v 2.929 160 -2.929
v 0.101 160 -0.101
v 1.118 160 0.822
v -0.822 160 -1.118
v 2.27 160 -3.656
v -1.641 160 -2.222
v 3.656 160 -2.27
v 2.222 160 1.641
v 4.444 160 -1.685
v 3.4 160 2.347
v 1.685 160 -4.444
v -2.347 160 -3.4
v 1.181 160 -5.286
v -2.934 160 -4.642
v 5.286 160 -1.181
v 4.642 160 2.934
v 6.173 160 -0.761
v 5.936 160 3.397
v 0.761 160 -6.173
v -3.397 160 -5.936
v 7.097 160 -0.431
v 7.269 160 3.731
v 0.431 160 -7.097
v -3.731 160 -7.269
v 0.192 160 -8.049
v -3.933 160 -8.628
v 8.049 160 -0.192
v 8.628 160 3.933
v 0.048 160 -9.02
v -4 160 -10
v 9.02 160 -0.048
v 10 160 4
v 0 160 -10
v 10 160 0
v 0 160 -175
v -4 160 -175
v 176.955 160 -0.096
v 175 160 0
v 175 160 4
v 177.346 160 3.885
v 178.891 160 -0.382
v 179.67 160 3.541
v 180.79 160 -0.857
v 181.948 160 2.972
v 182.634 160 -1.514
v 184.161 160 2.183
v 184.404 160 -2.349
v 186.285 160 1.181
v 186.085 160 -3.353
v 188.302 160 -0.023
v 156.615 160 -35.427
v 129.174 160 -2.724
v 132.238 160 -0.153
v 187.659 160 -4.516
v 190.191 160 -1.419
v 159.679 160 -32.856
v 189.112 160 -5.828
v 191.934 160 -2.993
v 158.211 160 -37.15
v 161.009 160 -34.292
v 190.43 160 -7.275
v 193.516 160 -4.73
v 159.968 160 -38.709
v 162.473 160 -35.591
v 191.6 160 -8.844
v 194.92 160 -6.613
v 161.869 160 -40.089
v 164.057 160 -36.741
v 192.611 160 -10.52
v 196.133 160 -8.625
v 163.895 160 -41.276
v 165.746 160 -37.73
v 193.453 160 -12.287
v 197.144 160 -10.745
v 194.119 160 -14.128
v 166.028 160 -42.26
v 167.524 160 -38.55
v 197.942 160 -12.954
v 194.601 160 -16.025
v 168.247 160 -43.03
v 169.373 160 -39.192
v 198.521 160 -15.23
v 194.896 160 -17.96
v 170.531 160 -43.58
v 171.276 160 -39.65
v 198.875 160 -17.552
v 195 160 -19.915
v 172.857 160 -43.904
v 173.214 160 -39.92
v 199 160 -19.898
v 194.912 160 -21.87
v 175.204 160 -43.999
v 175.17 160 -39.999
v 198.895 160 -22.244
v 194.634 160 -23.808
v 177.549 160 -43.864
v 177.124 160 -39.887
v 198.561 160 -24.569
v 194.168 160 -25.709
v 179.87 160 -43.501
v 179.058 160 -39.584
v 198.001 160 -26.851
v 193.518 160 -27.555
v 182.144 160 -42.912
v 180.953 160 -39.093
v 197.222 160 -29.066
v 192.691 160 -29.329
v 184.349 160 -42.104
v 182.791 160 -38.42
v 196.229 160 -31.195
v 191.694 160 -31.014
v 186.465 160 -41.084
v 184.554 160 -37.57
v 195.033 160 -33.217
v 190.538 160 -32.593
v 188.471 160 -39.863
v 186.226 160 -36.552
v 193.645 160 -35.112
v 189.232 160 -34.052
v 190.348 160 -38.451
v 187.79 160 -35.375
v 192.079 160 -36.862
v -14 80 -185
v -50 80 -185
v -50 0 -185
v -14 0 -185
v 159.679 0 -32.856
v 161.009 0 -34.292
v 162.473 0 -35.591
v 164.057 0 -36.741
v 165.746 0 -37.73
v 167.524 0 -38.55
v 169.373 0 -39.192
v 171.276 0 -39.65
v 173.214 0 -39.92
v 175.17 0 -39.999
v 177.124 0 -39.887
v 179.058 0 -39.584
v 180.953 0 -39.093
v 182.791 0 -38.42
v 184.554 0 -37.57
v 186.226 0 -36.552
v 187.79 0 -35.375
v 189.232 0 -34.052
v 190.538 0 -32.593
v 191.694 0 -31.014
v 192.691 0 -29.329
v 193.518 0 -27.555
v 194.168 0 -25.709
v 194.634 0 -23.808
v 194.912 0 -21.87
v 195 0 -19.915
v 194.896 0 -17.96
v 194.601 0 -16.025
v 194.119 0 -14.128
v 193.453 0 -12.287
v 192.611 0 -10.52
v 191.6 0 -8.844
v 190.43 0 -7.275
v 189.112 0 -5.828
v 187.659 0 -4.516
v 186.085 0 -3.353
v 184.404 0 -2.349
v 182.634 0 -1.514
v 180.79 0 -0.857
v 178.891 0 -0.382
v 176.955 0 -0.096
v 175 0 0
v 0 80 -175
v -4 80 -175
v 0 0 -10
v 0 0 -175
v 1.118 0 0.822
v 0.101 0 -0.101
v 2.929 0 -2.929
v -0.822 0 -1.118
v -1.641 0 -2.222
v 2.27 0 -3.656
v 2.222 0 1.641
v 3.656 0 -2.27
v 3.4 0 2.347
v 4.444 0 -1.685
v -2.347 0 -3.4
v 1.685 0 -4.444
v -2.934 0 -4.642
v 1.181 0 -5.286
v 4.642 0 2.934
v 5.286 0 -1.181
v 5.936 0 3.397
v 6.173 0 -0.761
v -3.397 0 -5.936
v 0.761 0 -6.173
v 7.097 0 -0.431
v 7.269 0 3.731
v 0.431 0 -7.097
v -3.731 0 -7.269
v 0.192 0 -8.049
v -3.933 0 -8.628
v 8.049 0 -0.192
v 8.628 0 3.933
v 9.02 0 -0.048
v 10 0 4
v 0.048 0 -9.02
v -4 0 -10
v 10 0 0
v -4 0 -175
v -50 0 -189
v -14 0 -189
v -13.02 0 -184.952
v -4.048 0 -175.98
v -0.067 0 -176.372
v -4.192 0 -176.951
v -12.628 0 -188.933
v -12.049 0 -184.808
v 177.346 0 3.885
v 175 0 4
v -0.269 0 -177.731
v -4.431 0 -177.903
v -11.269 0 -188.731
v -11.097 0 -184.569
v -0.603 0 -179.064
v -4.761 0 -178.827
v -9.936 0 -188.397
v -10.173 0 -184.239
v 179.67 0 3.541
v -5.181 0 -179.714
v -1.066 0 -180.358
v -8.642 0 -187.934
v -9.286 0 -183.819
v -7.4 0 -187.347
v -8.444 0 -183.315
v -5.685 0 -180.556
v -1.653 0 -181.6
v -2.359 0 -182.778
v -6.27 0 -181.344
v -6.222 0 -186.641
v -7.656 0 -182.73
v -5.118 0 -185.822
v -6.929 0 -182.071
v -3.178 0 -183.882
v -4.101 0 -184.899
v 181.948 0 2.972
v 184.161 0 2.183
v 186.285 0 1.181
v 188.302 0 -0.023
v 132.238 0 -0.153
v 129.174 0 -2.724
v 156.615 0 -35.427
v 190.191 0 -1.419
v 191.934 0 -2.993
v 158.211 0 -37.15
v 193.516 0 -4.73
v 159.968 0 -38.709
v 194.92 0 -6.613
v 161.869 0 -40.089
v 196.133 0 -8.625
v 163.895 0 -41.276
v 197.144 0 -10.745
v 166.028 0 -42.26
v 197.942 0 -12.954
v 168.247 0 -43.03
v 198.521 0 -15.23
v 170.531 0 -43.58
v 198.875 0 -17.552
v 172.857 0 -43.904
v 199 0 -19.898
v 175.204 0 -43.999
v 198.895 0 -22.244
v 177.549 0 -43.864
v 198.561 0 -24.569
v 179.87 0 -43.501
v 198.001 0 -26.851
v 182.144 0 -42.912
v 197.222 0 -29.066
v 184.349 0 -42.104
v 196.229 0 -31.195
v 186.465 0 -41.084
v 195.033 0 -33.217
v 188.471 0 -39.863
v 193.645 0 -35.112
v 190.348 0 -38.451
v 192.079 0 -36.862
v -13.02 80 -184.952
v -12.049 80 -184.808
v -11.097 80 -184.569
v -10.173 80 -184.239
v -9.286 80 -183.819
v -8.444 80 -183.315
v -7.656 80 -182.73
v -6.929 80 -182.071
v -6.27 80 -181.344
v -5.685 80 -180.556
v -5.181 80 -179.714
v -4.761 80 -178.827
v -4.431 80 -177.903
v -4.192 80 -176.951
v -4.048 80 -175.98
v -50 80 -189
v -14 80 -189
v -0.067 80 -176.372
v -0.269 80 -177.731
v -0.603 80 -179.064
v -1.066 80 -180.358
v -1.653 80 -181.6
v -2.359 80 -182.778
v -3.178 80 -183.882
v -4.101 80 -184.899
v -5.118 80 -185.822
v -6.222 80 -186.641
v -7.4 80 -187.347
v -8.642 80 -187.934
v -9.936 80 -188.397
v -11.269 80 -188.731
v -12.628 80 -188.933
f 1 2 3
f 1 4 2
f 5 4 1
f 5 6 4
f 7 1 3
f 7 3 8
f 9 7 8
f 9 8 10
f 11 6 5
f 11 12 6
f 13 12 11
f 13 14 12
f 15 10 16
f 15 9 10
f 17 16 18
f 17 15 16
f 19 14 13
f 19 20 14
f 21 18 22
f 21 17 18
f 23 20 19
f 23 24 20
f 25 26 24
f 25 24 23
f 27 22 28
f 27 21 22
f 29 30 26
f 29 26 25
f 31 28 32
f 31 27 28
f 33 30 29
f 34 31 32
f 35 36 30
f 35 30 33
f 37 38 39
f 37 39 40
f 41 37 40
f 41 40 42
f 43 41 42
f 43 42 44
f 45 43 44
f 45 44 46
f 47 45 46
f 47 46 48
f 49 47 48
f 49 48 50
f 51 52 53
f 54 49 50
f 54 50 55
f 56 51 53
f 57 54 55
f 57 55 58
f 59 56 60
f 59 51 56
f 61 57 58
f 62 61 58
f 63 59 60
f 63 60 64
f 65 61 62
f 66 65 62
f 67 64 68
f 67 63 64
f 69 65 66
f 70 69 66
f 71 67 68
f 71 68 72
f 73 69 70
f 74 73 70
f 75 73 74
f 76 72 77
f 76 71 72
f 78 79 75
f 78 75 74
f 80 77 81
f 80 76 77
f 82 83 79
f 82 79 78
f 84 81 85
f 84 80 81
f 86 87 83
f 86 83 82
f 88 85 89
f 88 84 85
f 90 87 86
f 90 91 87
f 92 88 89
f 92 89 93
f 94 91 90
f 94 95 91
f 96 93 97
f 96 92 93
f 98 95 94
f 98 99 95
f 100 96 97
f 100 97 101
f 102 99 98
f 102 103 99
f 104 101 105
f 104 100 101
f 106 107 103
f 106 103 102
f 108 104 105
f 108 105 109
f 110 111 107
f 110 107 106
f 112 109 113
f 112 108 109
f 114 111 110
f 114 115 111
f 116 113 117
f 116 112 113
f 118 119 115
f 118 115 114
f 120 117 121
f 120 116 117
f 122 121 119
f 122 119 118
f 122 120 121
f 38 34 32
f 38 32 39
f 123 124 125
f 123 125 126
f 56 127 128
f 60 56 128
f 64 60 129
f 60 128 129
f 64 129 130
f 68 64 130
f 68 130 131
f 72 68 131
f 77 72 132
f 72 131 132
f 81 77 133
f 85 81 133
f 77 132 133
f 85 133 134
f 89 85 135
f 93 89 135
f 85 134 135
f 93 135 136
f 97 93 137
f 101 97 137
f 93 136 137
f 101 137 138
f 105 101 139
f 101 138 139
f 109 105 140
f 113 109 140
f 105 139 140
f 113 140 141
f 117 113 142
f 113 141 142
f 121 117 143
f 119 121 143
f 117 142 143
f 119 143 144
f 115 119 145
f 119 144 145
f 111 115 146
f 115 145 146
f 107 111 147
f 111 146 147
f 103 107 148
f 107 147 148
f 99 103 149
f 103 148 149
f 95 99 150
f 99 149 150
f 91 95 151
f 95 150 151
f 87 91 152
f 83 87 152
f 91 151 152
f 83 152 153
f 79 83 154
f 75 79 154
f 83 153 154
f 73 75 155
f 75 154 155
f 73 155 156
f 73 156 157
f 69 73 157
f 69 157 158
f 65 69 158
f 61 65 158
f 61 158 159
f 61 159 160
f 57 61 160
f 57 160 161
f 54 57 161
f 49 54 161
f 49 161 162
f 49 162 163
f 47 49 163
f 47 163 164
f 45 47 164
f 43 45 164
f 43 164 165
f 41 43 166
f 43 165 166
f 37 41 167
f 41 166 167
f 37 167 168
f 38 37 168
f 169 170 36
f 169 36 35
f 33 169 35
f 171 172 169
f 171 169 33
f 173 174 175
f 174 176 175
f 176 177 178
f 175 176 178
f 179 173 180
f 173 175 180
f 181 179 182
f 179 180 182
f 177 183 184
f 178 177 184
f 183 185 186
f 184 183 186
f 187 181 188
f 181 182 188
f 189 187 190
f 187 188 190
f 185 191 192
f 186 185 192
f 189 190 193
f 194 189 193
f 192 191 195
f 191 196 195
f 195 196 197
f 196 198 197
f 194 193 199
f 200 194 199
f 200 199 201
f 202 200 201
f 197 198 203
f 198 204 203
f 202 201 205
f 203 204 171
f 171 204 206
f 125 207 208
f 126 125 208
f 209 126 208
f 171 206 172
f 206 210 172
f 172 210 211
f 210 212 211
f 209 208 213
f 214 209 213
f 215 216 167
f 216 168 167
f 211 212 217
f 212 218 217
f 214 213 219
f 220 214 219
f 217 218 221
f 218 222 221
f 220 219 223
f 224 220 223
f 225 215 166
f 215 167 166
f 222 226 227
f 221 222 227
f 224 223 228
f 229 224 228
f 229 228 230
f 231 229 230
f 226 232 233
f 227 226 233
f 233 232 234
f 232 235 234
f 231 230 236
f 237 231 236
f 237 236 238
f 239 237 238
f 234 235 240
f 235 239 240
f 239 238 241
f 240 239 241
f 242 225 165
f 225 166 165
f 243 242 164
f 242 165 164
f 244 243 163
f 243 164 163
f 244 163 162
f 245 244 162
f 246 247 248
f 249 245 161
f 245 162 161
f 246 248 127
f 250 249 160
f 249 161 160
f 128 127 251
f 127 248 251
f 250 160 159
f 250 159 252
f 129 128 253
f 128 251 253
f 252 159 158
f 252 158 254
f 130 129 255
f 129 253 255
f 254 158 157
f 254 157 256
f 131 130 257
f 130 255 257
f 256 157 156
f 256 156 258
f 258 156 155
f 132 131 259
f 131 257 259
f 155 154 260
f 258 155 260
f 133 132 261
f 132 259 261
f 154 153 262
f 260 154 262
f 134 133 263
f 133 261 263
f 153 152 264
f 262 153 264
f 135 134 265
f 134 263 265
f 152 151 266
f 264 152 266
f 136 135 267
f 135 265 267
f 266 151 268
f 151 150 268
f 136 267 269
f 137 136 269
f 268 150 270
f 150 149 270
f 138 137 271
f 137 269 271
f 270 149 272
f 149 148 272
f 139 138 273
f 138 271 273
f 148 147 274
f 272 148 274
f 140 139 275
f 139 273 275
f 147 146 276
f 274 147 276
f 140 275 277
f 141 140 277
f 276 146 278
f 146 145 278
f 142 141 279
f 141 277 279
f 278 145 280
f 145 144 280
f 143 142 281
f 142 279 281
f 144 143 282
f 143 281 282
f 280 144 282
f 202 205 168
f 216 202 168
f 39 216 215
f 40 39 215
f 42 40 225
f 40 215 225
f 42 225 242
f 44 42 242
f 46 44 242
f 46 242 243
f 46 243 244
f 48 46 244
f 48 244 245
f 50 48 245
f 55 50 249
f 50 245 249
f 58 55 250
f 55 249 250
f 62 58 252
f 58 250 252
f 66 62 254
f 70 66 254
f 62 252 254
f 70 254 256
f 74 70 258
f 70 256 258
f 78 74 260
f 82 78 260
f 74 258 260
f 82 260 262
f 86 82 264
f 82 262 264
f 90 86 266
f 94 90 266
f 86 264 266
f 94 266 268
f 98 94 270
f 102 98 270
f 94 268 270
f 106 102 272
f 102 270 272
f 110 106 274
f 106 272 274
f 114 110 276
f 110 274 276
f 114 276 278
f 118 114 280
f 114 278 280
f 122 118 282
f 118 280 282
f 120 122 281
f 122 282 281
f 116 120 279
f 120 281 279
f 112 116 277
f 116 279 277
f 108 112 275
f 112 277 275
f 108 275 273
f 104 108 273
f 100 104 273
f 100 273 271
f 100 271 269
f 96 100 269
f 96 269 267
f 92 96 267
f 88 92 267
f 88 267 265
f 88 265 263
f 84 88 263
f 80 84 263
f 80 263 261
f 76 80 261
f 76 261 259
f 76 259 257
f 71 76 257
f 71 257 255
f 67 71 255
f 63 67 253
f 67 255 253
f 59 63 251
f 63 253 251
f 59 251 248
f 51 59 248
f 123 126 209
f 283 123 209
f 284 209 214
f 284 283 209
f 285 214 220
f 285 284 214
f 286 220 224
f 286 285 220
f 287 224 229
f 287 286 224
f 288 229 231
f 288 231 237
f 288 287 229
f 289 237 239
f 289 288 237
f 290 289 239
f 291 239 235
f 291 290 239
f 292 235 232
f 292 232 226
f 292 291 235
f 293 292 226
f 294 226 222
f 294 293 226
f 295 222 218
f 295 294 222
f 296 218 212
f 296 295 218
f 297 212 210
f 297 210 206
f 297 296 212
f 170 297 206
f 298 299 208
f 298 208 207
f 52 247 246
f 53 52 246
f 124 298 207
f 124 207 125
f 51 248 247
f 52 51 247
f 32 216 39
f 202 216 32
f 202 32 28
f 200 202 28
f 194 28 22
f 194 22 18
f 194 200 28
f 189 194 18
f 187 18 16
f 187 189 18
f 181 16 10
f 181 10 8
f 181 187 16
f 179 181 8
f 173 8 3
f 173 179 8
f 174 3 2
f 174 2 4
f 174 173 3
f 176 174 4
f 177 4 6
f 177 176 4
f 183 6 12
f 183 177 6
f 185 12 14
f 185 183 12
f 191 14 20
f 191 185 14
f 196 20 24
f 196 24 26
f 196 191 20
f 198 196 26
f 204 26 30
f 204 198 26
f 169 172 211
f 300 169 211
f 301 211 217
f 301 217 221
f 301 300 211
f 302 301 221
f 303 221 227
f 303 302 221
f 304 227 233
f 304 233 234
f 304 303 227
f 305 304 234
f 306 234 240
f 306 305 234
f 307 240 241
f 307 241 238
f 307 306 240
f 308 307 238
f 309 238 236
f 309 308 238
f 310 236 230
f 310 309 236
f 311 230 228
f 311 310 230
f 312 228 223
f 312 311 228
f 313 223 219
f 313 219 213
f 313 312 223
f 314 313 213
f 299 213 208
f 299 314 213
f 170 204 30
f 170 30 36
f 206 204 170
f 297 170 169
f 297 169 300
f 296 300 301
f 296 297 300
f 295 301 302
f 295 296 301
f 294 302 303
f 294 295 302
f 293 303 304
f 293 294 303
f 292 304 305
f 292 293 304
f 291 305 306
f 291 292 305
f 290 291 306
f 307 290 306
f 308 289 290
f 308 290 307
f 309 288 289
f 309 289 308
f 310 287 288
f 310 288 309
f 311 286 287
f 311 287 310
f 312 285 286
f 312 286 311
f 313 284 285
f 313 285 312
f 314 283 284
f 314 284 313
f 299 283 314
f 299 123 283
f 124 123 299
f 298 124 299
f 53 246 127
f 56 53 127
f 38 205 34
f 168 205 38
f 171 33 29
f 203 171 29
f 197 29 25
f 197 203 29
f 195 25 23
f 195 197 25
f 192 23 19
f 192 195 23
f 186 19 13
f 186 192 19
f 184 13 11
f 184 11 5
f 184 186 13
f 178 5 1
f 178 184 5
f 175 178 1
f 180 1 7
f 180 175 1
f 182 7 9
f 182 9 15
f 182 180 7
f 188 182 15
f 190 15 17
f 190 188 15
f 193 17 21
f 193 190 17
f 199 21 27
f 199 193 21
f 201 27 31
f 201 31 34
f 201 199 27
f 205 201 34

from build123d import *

# Parameters (mm, degrees)
BASE_FLANGE3_DEPTH = 160
EDGE_FLANGE4_DEPTH = 80
HEM1_DEPTH         = 160


# Read off the part's stored shape, not the designer's step: Hem1
# Sheet-metal steps are written as plain solids
with BuildPart() as part:
    # Sketch1 → Base-Flange3 (new body)
    with BuildSketch(Plane(origin=(0, 0, 0), x_dir=(1, 0, 0), z_dir=(0, 1, 0))):
        with BuildLine():
            Line((0, 175), (0, 10))
            ThreePointArc((0, 10), (2.928932188, 2.928932188), (10, 0))
            Line((10, 0), (175, 0))
            Line((175, 0), (175, -4))
            Line((175, -4), (10, -4))
            ThreePointArc((10, -4), (0.100505063, 0.100505063), (-4, 10))
            Line((-4, 10), (-4, 175))
            Line((-4, 175), (0, 175))
        make_face()
    extrude(amount=BASE_FLANGE3_DEPTH)

    # Edge-Flange4 section (across the edge) → Edge-Flange4 (add)
    with BuildSketch(Plane(origin=(-4, 80, -185), x_dir=(0, 0, 1), z_dir=(0, -1, 0))):
        with BuildLine():
            Line((-4, 10), (-4, 46))
            Line((-4, 46), (0, 46))
            Line((0, 46), (0, 10))
            ThreePointArc((0, 10), (2.928932188, 2.928932188), (10, 0))
            Line((10, 0), (10, -4))
            ThreePointArc((10, -4), (0.100505063, 0.100505063), (-4, 10))
        make_face()
    extrude(amount=EDGE_FLANGE4_DEPTH)

    # Hem1 outline → Hem1 (add)
    with BuildSketch(Plane(origin=(0, 0, 0), x_dir=(1, 0, 0), z_dir=(0, 1, 0))):
        with BuildLine():
            Line((129.174241339, 2.724359327), (132.238419112, 0.153208889))
            Line((132.238419112, 0.153208889), (159.679111138, 32.855752194))
            ThreePointArc((159.679111138, 32.855752194), (193.126155741, 28.452365235), (175, 0))
            Line((175, 0), (175, -4))
            ThreePointArc((175, -4), (196.751386889, 30.142838282), (156.614933365, 35.426902632))
            Line((156.614933365, 35.426902632), (129.174241339, 2.724359327))
        make_face()
    extrude(amount=HEM1_DEPTH)


solid = part.part
